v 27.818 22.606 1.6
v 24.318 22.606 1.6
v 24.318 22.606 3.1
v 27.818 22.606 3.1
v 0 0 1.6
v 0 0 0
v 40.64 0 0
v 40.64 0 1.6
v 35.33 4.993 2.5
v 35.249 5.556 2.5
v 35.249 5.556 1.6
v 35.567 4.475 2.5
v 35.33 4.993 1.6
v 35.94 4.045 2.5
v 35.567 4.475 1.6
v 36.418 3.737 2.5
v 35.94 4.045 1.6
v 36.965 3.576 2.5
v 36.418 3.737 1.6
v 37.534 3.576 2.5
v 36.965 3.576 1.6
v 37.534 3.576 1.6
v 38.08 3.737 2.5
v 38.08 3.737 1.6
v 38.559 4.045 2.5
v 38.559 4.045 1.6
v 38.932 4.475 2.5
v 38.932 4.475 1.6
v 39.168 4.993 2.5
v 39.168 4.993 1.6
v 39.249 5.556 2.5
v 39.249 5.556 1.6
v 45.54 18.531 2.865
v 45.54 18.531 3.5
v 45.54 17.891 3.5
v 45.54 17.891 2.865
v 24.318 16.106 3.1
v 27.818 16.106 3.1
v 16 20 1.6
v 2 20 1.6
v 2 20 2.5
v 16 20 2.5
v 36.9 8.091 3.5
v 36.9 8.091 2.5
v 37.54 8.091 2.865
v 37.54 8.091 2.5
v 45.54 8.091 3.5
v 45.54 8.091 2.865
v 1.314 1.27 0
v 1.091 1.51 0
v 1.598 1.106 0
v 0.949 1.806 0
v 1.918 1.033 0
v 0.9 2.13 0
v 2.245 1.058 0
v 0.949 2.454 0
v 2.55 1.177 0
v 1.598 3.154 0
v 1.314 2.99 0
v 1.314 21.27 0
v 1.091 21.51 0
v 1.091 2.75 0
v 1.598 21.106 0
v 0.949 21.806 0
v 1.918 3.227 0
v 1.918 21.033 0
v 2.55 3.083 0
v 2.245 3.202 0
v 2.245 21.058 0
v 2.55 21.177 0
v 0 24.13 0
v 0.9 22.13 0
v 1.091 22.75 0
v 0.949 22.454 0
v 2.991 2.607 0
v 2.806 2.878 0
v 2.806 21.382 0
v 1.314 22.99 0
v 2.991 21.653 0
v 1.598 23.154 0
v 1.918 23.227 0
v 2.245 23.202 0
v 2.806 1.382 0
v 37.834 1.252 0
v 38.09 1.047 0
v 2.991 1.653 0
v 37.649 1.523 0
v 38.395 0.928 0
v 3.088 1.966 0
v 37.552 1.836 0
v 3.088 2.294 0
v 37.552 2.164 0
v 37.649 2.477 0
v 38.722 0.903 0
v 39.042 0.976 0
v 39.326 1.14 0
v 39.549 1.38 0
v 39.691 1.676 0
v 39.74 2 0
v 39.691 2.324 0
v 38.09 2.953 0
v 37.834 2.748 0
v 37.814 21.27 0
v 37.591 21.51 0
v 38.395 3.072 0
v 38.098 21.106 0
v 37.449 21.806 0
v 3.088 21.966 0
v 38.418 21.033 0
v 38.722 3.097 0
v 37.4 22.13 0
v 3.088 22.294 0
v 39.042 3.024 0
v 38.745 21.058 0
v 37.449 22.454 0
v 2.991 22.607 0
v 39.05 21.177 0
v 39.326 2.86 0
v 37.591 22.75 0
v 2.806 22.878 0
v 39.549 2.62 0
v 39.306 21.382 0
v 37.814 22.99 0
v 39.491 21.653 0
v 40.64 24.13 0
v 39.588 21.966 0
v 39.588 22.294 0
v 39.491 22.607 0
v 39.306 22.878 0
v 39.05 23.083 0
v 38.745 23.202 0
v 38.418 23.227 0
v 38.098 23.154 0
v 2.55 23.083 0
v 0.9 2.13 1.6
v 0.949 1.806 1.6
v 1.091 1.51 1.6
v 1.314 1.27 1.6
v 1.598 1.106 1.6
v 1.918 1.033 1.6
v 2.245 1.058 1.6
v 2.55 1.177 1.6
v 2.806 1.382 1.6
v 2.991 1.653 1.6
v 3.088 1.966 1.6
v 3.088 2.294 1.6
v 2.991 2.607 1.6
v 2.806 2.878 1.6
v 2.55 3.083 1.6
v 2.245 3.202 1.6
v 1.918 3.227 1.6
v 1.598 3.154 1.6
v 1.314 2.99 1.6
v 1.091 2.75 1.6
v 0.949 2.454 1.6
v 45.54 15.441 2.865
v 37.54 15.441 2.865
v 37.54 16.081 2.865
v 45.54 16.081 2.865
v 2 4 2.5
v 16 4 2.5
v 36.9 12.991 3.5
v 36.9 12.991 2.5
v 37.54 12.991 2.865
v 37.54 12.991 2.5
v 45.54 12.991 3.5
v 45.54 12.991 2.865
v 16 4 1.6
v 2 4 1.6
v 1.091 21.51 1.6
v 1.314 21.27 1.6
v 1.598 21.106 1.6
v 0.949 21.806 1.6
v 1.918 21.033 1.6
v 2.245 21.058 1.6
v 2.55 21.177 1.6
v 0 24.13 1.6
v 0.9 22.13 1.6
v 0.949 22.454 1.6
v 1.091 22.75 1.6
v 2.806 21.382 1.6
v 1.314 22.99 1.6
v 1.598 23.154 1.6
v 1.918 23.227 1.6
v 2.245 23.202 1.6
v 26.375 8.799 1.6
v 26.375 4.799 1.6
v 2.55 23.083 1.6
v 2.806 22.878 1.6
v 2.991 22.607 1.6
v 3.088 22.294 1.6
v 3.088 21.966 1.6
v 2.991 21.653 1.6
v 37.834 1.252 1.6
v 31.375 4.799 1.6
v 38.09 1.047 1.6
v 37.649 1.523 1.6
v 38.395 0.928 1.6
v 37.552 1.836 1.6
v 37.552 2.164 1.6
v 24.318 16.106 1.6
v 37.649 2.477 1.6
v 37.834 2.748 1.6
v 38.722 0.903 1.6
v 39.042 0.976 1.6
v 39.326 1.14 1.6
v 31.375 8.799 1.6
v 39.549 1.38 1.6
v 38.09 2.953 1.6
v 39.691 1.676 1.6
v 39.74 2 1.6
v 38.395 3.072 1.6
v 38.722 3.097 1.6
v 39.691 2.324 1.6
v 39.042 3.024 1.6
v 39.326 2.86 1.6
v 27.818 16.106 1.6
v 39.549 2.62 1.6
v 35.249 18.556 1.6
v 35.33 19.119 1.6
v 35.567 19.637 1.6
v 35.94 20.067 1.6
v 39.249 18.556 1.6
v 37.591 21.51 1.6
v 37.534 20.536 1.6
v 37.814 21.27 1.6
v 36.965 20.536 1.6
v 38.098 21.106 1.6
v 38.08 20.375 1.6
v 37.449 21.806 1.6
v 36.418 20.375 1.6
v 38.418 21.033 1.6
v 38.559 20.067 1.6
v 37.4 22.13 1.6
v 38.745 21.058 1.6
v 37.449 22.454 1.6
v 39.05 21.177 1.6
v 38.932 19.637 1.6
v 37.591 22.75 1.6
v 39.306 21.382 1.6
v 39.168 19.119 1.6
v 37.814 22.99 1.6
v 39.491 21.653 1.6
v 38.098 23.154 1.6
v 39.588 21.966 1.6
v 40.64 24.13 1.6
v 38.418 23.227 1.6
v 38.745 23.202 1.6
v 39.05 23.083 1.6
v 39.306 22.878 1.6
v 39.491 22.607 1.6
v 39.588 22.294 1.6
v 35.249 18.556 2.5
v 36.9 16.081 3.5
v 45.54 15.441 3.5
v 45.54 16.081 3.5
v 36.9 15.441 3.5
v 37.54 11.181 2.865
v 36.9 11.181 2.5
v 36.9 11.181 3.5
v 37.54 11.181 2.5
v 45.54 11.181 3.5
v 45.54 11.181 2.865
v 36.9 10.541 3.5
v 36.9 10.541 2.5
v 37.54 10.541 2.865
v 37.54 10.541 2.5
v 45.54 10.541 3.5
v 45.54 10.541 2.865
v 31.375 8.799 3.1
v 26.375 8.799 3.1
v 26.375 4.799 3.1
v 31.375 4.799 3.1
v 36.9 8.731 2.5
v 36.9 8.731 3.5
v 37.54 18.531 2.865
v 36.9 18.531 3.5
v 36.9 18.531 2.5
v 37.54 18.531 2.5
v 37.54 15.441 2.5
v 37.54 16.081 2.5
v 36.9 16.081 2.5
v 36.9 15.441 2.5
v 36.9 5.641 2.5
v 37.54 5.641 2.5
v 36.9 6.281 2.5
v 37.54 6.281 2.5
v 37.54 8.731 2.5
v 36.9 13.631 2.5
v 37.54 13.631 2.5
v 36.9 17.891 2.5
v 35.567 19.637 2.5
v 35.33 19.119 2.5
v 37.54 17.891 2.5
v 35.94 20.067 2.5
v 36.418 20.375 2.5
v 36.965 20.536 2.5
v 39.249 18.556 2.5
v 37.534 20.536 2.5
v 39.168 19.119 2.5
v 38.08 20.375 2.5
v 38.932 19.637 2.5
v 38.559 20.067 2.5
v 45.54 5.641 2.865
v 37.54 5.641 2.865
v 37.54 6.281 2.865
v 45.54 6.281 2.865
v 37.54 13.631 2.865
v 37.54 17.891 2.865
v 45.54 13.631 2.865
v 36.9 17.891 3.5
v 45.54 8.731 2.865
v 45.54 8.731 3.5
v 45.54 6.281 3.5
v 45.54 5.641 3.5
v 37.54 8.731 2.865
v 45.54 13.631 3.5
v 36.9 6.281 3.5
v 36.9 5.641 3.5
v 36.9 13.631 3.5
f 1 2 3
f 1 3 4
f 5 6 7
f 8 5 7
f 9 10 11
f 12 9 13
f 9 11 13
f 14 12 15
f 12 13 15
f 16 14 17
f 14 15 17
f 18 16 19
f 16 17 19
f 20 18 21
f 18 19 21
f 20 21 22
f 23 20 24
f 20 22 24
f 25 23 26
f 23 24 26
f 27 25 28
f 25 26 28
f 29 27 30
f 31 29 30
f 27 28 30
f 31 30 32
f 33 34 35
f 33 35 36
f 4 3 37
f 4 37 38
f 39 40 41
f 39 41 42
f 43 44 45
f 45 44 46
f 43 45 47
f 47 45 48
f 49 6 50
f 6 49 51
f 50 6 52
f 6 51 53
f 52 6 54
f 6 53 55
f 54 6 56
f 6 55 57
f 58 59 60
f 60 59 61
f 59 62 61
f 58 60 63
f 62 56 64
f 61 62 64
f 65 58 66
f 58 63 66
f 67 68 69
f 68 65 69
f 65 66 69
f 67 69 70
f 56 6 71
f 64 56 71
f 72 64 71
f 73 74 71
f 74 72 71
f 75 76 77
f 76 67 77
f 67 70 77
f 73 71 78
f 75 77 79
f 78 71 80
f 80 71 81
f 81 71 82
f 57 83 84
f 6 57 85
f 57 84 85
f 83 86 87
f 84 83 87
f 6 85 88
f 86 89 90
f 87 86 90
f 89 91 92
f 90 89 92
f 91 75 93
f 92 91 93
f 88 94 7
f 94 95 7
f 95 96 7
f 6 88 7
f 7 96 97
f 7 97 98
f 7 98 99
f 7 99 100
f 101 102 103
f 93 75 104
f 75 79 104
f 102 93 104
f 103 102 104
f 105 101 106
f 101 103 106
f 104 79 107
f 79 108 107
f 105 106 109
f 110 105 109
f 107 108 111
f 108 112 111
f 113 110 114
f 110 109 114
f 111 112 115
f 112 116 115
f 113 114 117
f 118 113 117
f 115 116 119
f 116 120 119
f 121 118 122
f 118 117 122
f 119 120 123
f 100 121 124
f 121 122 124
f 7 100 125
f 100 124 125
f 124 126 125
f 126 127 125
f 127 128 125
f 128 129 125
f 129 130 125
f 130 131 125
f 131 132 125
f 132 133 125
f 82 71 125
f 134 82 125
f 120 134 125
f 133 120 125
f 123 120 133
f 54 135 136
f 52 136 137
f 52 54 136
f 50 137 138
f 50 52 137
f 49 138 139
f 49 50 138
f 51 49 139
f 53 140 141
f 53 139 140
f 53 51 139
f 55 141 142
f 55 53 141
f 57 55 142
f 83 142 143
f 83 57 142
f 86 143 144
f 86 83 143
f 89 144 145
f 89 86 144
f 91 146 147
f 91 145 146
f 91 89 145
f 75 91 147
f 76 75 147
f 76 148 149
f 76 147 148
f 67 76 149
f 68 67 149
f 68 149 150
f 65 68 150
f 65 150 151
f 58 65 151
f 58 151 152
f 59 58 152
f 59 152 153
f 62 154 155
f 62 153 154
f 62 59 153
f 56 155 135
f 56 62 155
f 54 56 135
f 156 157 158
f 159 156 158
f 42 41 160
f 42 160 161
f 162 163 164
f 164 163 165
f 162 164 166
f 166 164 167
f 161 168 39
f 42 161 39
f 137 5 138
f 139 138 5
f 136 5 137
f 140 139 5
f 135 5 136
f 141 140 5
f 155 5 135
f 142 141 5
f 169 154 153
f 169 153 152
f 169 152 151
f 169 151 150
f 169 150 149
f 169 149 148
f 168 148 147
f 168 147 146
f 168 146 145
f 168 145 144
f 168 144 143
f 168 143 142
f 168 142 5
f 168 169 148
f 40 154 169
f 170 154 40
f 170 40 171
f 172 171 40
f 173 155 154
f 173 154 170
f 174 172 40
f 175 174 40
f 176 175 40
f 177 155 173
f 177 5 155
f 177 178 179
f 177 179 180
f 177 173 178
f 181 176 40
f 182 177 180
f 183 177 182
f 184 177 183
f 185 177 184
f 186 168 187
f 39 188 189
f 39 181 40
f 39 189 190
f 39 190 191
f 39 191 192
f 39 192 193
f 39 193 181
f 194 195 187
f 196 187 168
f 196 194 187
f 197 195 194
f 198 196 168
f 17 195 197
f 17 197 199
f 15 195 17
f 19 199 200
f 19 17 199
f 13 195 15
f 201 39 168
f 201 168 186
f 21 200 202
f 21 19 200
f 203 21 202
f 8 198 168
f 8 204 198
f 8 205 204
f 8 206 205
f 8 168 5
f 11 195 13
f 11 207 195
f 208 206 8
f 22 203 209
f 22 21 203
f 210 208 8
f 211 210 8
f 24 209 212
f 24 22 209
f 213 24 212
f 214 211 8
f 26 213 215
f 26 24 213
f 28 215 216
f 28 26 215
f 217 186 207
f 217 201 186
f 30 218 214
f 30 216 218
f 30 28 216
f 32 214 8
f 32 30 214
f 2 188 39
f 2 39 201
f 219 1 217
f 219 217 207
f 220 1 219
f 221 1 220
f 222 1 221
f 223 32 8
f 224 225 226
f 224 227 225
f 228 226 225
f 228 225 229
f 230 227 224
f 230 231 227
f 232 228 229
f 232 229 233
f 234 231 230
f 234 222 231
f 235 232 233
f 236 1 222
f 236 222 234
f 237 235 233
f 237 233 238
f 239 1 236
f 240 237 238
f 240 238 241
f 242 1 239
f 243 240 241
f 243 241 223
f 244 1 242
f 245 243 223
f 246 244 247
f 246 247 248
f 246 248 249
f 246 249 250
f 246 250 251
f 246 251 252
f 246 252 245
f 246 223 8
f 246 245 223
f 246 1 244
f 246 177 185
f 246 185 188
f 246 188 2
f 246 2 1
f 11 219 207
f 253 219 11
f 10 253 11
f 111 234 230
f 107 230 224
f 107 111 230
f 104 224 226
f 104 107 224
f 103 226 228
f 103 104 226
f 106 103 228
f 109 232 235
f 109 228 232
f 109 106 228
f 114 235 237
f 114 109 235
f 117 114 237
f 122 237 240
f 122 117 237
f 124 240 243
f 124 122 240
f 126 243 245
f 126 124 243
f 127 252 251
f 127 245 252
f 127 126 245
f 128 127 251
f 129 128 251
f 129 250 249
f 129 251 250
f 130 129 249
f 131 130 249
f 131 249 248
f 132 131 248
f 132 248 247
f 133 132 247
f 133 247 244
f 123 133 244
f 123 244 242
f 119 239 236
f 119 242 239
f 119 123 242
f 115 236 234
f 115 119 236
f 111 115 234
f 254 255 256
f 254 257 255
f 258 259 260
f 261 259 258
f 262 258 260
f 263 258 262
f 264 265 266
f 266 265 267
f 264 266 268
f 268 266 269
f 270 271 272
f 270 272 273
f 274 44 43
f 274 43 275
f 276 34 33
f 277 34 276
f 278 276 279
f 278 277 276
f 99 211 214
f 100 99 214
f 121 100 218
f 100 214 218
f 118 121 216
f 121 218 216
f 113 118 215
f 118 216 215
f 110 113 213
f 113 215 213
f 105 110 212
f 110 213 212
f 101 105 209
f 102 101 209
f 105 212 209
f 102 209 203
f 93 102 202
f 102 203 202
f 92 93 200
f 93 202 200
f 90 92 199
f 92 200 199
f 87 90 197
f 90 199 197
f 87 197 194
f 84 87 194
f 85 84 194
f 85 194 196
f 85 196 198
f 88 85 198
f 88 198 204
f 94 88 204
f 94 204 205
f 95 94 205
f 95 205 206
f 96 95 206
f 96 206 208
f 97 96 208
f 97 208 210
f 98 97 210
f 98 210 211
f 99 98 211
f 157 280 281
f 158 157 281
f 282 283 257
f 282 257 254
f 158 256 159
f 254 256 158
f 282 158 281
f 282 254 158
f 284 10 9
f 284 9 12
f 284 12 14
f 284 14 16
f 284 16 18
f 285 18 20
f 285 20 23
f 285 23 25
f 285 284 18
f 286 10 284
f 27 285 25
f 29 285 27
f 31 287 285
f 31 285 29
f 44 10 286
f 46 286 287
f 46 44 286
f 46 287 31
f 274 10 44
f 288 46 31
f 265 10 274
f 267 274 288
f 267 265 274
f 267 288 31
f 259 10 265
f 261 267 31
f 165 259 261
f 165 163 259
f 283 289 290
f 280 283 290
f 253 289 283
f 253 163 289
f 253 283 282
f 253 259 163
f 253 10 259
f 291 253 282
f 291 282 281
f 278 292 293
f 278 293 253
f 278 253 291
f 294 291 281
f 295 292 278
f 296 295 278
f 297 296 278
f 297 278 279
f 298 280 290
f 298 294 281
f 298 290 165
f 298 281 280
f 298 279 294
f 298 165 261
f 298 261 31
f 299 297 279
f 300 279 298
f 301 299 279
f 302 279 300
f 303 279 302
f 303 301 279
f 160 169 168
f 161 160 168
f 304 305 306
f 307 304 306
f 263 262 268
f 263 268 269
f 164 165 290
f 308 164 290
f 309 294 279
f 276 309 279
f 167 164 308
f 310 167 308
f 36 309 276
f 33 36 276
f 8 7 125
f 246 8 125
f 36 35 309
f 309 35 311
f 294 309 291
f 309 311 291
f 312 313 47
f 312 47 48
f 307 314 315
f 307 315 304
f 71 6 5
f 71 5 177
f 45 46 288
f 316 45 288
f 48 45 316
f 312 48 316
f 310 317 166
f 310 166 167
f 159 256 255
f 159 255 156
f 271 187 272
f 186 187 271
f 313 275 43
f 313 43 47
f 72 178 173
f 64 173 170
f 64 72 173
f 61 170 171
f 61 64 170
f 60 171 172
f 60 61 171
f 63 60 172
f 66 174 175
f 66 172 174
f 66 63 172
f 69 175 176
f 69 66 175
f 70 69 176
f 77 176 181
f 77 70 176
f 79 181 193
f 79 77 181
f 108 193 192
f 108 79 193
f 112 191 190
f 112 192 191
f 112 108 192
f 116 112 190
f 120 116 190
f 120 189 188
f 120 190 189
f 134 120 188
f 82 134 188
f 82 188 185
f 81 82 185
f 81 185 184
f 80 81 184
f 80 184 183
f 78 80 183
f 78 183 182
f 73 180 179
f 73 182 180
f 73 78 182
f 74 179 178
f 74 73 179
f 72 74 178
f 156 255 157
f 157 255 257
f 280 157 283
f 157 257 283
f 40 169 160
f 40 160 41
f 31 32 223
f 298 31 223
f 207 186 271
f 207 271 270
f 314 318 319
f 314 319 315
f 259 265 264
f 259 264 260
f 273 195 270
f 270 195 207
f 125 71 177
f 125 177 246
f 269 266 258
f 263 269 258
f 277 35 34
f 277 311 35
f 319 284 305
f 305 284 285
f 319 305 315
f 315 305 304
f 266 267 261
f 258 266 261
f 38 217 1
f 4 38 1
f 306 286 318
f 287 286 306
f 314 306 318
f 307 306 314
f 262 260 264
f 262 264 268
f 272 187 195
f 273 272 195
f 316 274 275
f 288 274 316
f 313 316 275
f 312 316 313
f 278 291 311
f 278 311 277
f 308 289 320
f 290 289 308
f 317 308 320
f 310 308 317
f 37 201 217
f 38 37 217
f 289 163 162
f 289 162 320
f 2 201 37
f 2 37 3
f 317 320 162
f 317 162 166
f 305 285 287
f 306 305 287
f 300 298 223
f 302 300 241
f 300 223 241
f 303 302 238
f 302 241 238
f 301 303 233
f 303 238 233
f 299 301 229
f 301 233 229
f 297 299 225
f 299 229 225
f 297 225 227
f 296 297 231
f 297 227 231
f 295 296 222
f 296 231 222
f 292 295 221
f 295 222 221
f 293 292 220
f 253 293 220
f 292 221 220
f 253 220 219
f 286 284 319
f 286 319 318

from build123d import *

# Parameters (mm, degrees)
SKETCH1_W           = 40.64
SKETCH1_H           = 24.13
BOSS_EXTRUDE1_DEPTH = 1.6
SKETCH2_W           = 13.99999994
SKETCH2_H           = 16
BOSS_EXTRUDE2_DEPTH = 2.5
SKETCH3_R           = 1.1
CUT_EXTRUDE1_DEPTH  = 2.5
LPATTERN1_COUNT     = 2
LPATTERN1_PITCH     = 36.5
LPATTERN2_COUNT     = 2
LPATTERN2_PITCH     = 20
SKETCH4_R           = 1.1
CUT_EXTRUDE2_DEPTH  = 2.5
BOSS_EXTRUDE3_DEPTH = 2.5
SKETCH6_W           = 0.64
SKETCH6_H           = 0.64
BOSS_EXTRUDE4_DEPTH = 1
SKETCH8_W           = 0.635
SKETCH8_H           = 0.64
BOSS_EXTRUDE5_DEPTH = 8
LPATTERN7_COUNT     = 6
LPATTERN7_PITCH     = 2.45
SKETCH9_W           = 3.5
SKETCH9_H           = 6.5
BOSS_EXTRUDE6_DEPTH = 1.5
SKETCH10_W          = 5
SKETCH10_H          = 4
BOSS_EXTRUDE7_DEPTH = 1.5


with BuildPart() as part:
    # Sketch1 → Boss-Extrude1 (new body)
    with BuildSketch(Plane.XY):
        with Locations((20.32, 12.065)):
            Rectangle(SKETCH1_W, SKETCH1_H)
    extrude(amount=BOSS_EXTRUDE1_DEPTH)

    # Sketch2 → Boss-Extrude2 (add)
    with BuildSketch(Plane.XY):
        with Locations((8.99999997, 12)):
            Rectangle(SKETCH2_W, SKETCH2_H)
    extrude(amount=BOSS_EXTRUDE2_DEPTH)

    # Sketch3 → Cut-Extrude1 (cut)
    with BuildSketch(Plane.XY):
        with Locations(Location((2, 22.129999936, 0), (0, 0, 180))):
            Circle(SKETCH3_R)
    cut_extrude1 = extrude(amount=CUT_EXTRUDE1_DEPTH, mode=Mode.SUBTRACT)

    # LPattern1: Cut-Extrude1 ×2
    with Locations(*[(i * LPATTERN1_PITCH, 0, 0) for i in range(1, LPATTERN1_COUNT)]):
        add(cut_extrude1, mode=Mode.SUBTRACT)

    # LPattern2: Cut-Extrude1 ×2
    with Locations(*[(0, -i * LPATTERN2_PITCH, 0) for i in range(1, LPATTERN2_COUNT)]):
        add(cut_extrude1, mode=Mode.SUBTRACT)

    # Sketch4 → Cut-Extrude2 (cut)
    with BuildSketch(Plane.XY.offset(1.6)):
        with Locations((38.64, 2.000000064)):
            Circle(SKETCH4_R)
    extrude(amount=-CUT_EXTRUDE2_DEPTH, mode=Mode.SUBTRACT)

    # Sketch5 → Boss-Extrude3 (add)
    with BuildSketch(Plane.XY):
        with BuildLine():
            Line((35.249253939, 18.555999972), (35.249253939, 5.556000064))
            ThreePointArc((35.249253939, 5.556000064), (37.249254003, 3.556), (39.249254067, 5.556000064))
            Line((39.249254067, 5.556000064), (39.249254067, 18.555999972))
            ThreePointArc((39.249254067, 18.555999972), (37.249254003, 20.556000036), (35.249253939, 18.555999972))
        make_face()
    extrude(amount=BOSS_EXTRUDE3_DEPTH)

    # Sketch6 → Boss-Extrude4 (add)
    with BuildSketch(Plane.XY.offset(2.5)):
        with Locations((37.220253939, 18.210599972)):
            Rectangle(SKETCH6_W, SKETCH6_H)
    boss_extrude4 = extrude(amount=BOSS_EXTRUDE4_DEPTH)

    # Sketch8 → Boss-Extrude5 (add)
    with BuildSketch(Plane(origin=(37.540253939, 0, 0), x_dir=(0, 0, -1), z_dir=(1, 0, 0))):
        with Locations((-3.1825, 18.210599972)):
            Rectangle(SKETCH8_W, SKETCH8_H)
    boss_extrude5 = extrude(amount=BOSS_EXTRUDE5_DEPTH)

    # LPattern7: Boss-Extrude4, Boss-Extrude5 ×6
    with Locations(*[(0, -i * LPATTERN7_PITCH, 0) for i in range(1, LPATTERN7_COUNT)]):
        add(boss_extrude4)
        add(boss_extrude5)

    # Sketch9 → Boss-Extrude6 (add)
    with BuildSketch(Plane.XY.offset(1.6)):
        with Locations((26.068319719, 19.356)):
            Rectangle(SKETCH9_W, SKETCH9_H)
    extrude(amount=BOSS_EXTRUDE6_DEPTH)

    # Sketch10 → Boss-Extrude7 (add)
    with BuildSketch(Plane.XY.offset(1.6)):
        with Locations((28.874727699, 6.798621882)):
            Rectangle(SKETCH10_W, SKETCH10_H)
    extrude(amount=BOSS_EXTRUDE7_DEPTH)


solid = part.part
